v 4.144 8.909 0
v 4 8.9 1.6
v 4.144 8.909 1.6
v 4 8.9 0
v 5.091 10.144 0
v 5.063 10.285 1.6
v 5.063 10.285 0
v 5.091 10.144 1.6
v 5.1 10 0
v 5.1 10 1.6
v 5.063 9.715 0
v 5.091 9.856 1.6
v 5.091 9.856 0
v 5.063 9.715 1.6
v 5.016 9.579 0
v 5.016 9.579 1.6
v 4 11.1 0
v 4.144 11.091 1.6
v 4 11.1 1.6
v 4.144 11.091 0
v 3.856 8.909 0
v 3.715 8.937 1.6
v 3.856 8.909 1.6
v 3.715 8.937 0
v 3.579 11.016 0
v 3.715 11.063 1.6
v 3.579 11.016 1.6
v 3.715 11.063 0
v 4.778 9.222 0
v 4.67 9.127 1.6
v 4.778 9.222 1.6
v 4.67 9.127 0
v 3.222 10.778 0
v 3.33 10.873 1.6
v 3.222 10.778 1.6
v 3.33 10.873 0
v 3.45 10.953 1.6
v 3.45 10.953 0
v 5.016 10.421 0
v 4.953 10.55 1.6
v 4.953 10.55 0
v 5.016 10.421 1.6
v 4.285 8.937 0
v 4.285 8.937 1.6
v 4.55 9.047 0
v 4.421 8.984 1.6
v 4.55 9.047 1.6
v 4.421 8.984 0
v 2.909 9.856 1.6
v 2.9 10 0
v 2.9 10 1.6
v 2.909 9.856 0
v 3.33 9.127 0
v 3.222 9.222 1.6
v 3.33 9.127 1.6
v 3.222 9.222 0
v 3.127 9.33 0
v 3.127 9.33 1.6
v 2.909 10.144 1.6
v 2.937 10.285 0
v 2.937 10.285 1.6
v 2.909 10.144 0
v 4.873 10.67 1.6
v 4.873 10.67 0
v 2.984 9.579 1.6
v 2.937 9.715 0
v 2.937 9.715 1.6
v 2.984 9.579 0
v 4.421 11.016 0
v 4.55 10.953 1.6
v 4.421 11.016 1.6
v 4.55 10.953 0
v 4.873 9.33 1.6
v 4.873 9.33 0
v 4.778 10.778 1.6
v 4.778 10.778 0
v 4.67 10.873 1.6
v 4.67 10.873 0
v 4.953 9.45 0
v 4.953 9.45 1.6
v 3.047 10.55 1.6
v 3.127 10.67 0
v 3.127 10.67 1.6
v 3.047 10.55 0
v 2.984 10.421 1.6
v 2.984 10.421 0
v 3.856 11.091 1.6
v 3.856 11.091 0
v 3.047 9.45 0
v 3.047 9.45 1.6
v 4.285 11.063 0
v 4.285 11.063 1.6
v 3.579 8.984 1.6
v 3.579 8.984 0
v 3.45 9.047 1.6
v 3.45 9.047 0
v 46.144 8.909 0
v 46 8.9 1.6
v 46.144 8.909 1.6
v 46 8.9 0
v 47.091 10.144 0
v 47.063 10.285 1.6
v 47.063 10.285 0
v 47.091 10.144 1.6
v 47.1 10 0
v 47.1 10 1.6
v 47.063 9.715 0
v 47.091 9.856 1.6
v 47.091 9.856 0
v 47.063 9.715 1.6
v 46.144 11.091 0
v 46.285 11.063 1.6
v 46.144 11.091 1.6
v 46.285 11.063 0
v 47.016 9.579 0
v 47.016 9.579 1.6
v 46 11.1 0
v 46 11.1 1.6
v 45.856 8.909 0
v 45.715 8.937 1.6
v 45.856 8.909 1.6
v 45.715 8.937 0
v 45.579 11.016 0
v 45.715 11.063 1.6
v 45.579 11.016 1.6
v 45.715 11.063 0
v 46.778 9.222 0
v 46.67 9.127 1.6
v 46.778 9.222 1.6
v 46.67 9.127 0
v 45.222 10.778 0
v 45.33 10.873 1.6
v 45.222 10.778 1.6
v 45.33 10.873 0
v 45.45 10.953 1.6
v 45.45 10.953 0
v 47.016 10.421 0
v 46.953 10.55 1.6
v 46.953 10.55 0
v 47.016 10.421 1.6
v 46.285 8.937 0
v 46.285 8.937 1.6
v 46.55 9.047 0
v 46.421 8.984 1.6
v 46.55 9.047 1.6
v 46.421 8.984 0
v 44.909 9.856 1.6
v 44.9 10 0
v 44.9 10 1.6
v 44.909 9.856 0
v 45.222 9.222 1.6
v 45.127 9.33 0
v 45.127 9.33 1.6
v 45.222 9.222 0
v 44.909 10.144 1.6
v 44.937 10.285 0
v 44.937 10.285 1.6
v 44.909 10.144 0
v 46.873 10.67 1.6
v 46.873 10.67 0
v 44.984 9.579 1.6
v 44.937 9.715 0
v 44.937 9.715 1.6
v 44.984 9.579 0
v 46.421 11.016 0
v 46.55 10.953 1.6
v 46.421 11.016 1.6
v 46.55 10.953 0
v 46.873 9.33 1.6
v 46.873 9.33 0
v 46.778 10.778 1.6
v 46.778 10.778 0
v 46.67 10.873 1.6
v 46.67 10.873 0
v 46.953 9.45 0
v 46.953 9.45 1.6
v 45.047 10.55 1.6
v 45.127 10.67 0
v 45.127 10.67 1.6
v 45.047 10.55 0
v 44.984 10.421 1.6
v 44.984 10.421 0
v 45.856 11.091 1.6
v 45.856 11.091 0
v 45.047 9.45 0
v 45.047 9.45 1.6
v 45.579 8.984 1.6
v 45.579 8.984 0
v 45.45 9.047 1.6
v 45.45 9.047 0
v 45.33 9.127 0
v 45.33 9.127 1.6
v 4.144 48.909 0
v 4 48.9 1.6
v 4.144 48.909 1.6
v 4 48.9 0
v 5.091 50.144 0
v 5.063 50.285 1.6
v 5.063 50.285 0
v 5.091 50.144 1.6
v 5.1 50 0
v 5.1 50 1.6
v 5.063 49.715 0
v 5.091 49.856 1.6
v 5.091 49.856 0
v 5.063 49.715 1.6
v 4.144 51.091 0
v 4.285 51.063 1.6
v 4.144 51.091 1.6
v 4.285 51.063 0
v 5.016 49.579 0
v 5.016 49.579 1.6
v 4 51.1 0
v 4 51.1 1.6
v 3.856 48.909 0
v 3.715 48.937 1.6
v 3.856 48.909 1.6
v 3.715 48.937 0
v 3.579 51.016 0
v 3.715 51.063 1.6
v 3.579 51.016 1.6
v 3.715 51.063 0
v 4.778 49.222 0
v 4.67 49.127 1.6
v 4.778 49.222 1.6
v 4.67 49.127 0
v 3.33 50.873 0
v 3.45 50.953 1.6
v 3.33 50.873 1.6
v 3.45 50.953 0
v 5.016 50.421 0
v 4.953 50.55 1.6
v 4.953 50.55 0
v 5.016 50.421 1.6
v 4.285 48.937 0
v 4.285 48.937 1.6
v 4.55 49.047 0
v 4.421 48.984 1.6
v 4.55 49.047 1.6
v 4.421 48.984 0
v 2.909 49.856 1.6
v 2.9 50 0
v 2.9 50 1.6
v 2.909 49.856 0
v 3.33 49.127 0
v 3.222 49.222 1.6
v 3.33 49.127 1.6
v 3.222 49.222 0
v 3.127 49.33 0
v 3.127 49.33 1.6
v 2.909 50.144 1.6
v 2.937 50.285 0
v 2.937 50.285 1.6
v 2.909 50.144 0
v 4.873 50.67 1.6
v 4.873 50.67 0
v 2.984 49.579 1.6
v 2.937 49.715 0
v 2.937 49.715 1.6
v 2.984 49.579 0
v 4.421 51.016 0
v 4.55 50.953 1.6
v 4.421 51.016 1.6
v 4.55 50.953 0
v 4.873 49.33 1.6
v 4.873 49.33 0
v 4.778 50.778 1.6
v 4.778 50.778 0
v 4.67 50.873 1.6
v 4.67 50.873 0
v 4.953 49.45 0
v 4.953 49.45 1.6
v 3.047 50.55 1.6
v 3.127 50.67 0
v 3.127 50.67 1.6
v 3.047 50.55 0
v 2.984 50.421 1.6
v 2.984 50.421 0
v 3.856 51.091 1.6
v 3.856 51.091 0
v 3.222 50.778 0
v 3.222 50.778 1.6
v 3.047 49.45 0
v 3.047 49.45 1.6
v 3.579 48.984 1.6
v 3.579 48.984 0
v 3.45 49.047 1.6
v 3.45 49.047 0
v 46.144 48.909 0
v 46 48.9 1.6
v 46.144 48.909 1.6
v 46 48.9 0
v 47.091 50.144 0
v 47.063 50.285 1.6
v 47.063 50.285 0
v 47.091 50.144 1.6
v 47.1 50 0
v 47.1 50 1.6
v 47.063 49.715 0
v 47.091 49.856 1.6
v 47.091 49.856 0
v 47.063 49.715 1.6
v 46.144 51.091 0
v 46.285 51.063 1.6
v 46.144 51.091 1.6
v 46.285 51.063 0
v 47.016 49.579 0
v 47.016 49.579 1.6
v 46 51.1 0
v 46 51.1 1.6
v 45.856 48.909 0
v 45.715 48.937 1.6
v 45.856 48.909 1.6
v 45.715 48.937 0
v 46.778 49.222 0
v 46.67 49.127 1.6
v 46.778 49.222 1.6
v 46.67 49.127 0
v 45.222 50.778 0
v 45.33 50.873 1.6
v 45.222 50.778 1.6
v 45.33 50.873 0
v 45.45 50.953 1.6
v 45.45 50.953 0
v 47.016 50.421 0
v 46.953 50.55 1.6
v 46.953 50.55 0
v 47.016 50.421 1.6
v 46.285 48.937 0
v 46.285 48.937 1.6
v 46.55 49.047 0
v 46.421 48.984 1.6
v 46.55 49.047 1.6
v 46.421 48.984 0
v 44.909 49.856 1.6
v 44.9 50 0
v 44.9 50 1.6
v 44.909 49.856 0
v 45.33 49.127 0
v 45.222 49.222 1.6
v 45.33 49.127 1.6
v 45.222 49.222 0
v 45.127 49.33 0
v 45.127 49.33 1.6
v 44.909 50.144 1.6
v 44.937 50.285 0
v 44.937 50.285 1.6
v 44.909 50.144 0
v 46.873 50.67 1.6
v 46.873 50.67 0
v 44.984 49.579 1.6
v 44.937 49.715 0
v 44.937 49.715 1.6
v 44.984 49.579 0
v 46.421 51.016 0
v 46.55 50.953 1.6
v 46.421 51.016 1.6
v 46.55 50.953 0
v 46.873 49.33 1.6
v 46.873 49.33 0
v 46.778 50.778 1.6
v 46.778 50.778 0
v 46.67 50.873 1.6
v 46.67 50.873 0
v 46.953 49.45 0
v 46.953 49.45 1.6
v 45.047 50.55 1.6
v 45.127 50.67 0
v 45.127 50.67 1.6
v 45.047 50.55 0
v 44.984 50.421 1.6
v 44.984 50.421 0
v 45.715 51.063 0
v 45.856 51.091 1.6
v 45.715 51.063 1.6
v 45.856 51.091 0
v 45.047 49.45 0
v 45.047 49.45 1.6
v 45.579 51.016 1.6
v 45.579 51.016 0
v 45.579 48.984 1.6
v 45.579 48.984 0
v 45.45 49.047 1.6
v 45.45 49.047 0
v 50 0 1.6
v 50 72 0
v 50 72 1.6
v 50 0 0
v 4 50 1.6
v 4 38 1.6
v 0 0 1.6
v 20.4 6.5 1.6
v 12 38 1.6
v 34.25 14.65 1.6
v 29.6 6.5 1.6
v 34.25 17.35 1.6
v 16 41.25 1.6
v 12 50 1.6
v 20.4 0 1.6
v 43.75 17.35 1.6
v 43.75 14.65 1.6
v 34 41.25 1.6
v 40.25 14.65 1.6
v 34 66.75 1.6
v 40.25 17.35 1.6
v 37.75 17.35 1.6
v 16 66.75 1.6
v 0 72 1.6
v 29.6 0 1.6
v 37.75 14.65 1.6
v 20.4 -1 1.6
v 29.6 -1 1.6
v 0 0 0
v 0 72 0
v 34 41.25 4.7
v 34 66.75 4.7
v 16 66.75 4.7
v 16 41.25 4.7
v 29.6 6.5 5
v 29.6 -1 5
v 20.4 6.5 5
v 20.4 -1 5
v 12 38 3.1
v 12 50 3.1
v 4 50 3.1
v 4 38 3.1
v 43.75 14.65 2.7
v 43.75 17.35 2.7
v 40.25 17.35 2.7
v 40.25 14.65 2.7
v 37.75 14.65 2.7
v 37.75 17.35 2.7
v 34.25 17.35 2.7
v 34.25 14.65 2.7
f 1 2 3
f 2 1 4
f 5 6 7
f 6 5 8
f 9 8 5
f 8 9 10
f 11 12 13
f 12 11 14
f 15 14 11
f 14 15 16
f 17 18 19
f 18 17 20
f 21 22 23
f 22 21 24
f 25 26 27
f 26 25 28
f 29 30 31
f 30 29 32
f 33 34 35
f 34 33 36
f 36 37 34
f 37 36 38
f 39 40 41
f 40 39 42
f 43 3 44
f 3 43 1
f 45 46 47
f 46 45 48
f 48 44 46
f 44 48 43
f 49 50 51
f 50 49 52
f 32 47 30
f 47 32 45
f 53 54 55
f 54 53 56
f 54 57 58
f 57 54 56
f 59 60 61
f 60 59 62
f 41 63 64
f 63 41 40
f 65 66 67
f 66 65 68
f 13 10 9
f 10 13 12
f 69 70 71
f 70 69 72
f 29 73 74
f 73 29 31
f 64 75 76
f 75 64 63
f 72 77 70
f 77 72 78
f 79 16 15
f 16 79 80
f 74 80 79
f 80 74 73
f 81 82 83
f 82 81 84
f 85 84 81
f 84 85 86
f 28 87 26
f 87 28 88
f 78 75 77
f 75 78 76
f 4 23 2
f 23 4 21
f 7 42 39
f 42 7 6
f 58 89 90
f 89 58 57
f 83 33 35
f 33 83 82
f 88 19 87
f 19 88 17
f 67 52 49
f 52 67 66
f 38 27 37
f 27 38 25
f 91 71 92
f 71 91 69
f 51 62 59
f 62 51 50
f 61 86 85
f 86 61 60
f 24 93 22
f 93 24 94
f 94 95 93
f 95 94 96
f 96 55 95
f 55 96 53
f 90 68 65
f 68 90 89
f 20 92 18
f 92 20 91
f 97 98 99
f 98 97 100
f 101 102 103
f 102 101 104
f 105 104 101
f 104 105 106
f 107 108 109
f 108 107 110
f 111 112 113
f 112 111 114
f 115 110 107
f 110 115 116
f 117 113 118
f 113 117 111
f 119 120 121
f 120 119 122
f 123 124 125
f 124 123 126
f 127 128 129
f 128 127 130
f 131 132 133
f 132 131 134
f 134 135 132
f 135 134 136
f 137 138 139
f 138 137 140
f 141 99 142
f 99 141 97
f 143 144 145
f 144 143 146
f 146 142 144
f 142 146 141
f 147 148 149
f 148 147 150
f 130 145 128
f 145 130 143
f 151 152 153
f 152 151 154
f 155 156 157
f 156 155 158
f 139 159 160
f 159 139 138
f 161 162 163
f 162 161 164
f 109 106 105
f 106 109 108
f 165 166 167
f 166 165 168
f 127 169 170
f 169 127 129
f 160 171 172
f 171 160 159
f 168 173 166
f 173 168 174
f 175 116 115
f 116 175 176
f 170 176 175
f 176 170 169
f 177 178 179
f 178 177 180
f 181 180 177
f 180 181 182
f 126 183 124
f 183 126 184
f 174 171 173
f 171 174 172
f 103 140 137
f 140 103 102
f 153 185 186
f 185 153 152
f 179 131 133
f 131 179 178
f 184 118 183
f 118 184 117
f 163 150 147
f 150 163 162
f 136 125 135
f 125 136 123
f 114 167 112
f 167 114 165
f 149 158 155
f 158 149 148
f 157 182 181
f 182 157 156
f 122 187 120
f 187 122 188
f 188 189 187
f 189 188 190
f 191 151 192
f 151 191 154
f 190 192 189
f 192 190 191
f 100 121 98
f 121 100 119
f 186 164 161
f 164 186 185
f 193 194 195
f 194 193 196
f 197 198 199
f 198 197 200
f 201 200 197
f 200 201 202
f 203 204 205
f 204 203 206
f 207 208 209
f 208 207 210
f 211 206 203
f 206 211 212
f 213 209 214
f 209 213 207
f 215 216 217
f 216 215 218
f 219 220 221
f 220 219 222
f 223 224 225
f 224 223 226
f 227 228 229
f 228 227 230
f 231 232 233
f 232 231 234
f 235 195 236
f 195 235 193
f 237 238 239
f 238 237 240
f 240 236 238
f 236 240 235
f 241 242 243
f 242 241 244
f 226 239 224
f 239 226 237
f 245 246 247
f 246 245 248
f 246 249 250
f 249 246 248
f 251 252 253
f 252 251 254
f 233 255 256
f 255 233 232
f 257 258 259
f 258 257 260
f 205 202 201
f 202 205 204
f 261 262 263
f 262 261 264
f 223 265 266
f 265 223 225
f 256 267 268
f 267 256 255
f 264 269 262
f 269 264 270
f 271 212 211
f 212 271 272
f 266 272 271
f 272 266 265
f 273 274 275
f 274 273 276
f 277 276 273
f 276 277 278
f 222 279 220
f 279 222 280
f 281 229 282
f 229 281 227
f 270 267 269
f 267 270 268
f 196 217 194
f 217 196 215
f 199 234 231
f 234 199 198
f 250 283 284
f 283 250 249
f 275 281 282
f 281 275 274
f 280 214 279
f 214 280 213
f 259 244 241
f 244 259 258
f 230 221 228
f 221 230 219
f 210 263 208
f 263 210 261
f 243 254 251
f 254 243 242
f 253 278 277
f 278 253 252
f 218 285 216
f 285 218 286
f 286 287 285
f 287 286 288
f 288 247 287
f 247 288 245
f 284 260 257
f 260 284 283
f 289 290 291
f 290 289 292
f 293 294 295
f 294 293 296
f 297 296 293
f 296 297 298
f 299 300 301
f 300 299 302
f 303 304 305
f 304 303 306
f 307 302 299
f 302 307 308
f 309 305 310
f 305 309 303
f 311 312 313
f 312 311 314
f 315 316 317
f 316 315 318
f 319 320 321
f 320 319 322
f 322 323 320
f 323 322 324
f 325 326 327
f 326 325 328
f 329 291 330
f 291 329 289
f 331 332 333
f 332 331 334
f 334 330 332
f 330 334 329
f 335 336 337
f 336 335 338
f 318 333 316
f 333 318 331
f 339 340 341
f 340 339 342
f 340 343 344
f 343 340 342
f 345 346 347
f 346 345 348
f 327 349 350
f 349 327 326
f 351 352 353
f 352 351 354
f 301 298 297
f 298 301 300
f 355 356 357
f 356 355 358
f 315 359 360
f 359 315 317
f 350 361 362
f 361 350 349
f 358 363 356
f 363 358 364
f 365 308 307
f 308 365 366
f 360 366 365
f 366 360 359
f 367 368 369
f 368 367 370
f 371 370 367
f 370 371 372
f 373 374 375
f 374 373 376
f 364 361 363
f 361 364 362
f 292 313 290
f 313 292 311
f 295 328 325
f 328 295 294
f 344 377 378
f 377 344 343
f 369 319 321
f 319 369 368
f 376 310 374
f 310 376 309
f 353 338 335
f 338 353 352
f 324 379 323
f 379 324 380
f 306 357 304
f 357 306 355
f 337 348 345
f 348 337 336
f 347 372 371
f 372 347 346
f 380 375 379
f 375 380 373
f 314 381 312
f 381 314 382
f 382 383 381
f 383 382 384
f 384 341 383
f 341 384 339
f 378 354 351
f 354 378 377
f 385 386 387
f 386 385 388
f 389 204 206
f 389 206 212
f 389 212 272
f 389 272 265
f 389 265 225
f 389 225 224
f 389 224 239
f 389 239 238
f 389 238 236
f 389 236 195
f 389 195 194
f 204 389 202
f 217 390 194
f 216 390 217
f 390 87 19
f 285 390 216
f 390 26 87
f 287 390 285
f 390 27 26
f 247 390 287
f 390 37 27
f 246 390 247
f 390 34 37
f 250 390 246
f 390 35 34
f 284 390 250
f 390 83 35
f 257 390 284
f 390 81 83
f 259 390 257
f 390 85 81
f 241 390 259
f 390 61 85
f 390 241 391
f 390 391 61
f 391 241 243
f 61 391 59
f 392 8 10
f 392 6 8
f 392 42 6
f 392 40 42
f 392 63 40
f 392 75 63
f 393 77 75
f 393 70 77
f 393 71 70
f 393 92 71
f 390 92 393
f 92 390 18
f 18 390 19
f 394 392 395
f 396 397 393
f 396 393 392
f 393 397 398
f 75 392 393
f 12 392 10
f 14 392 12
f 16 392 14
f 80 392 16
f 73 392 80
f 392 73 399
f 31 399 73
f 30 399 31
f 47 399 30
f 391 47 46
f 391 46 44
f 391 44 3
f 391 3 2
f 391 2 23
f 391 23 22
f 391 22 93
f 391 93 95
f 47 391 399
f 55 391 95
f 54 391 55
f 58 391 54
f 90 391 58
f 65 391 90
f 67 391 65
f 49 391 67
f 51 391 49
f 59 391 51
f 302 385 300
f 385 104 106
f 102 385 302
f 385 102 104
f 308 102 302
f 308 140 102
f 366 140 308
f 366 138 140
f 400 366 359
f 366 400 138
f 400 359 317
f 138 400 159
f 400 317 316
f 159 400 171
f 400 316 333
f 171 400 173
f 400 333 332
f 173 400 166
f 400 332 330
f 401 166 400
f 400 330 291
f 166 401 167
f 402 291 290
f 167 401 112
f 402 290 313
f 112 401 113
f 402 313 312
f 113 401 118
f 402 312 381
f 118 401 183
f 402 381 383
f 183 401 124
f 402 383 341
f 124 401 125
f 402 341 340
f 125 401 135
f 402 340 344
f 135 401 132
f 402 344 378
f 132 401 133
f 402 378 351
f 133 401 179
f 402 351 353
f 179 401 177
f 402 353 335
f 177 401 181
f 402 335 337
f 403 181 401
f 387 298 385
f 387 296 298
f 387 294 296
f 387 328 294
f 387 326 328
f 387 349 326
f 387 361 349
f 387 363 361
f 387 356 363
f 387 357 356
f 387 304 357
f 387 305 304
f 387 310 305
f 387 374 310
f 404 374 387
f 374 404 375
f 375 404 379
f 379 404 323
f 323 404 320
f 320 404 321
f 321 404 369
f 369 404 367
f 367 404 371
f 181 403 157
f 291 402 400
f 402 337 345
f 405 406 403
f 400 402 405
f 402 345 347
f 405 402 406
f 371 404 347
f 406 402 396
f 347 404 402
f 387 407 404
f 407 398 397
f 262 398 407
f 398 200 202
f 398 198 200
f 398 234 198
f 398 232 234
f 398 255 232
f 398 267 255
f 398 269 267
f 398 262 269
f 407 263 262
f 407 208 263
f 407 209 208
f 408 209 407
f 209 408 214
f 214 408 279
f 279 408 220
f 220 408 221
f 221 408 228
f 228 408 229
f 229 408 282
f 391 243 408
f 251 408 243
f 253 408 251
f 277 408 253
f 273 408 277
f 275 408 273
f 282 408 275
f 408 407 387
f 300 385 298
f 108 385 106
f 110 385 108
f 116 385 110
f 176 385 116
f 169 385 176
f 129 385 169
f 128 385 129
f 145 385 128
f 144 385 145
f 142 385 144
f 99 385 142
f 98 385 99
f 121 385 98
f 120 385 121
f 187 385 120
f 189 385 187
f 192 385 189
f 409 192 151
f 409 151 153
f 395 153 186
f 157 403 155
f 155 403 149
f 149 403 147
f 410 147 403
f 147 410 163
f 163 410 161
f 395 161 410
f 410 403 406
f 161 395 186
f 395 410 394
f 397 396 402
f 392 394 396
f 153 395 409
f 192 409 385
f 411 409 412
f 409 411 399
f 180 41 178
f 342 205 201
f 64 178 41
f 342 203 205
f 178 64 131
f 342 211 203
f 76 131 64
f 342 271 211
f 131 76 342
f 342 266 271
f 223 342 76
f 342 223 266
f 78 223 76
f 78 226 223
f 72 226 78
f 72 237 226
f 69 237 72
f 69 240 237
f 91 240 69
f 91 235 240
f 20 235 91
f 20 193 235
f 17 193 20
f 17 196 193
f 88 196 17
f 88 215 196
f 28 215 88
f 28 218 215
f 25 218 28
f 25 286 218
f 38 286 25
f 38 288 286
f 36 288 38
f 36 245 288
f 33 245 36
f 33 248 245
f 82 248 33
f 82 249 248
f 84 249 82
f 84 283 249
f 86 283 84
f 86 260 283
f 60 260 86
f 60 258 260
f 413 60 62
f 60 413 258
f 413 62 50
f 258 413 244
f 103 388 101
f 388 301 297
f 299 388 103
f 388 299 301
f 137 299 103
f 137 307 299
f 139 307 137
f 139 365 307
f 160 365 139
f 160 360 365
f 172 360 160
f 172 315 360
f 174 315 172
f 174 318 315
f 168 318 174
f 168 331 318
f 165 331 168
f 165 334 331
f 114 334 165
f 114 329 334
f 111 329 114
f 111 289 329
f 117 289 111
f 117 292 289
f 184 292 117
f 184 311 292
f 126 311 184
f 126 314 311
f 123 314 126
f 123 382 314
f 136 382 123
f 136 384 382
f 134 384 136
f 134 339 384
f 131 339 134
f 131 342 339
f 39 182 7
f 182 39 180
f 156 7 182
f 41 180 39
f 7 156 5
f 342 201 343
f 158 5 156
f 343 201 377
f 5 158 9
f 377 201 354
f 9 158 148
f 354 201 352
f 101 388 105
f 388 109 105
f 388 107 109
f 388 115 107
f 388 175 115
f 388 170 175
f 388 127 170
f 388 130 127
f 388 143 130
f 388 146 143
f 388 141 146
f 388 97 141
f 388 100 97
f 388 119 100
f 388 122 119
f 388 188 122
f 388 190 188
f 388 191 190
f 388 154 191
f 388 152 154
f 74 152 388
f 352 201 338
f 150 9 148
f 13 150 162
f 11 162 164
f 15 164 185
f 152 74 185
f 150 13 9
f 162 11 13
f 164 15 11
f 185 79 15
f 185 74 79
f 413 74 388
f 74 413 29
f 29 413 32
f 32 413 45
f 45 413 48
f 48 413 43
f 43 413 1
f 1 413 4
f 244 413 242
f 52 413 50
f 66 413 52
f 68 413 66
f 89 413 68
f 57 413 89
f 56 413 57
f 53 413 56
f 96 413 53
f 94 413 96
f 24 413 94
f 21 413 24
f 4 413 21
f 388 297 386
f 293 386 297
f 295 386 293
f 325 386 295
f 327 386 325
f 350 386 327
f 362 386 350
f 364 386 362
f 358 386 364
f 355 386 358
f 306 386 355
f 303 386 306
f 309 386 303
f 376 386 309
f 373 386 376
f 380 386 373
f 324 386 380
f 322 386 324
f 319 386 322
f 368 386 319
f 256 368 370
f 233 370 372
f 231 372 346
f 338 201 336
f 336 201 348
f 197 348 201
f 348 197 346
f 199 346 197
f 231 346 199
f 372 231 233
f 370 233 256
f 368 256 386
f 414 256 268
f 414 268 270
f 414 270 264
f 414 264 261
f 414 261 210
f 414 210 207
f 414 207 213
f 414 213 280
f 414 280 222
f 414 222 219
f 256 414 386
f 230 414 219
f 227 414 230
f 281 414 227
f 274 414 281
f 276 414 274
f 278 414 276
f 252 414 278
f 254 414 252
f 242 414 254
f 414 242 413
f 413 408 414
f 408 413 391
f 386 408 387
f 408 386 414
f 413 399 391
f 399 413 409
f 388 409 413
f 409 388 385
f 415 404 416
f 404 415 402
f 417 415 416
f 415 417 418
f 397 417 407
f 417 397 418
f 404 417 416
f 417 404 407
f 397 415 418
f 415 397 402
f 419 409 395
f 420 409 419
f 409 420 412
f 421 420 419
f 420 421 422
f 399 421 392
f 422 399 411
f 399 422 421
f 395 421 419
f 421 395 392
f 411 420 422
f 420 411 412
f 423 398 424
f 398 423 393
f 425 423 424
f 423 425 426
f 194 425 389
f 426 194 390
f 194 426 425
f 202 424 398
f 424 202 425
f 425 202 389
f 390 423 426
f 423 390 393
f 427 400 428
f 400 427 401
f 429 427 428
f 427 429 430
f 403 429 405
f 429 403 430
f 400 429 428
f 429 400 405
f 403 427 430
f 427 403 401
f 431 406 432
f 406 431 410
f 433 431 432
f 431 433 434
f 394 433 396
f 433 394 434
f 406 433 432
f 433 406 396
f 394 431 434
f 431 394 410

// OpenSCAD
// MEB AI Asistan — kasa hizalama (mm)
// Orijin: kart sol-alt, Type-C kenarı = Y0, ekran yüzü = +Z
// Kart: 50 x 72 x 1.6   M2 NPTH Ø2.2

$fn = 48;

pcb_w = 50;
pcb_h = 72;
pcb_t = 1.6;

holes = [[4,10],[46,10],[4,50],[46,50]];
hole_d = 2.2;

// ESP32-S3-WROOM-1  (Top / ekran yüzü)
esp_w = 18;
esp_d = 25.5;
esp_t = 3.1;
esp_cx = 25;
esp_cy = 54;

// USB-C gövde (alt orta, karttan 1 mm taşar)
usb_w = 9.2;
usb_d = 7.5;
usb_t = 3.4;
usb_overhang = 1.0;

// J2 FPC 14P — ekran tarafı, sol
j2_w = 8;
j2_d = 12;
j2_t = 1.5;
j2_cx = 8;
j2_cy = 44;

// MK1 / MK2 (ekran yüzü, sağ alt)
mk_w = 3.5;
mk_d = 2.7;
mk_t = 1.1;

module board() {
    difference() {
        translate([0, 0, 0]) cube([pcb_w, pcb_h, pcb_t]);
        for (p = holes)
            translate([p[0], p[1], -1])
                cylinder(h = pcb_t + 2, d = hole_d);
    }
}

module esp32() {
    translate([esp_cx - esp_w/2, esp_cy - esp_d/2, pcb_t])
        cube([esp_w, esp_d, esp_t]);
}

module usbc() {
    translate([25 - usb_w/2, -usb_overhang, pcb_t])
        cube([usb_w, usb_d, usb_t]);
}

module j2() {
    translate([j2_cx - j2_w/2, j2_cy - j2_d/2, pcb_t])
        cube([j2_w, j2_d, j2_t]);
}

module mic(cx, cy) {
    translate([cx - mk_w/2, cy - mk_d/2, pcb_t])
        cube([mk_w, mk_d, mk_t]);
}

board();
esp32();
usbc();
j2();
mic(42, 16); // MK1
mic(36, 16); // MK2
